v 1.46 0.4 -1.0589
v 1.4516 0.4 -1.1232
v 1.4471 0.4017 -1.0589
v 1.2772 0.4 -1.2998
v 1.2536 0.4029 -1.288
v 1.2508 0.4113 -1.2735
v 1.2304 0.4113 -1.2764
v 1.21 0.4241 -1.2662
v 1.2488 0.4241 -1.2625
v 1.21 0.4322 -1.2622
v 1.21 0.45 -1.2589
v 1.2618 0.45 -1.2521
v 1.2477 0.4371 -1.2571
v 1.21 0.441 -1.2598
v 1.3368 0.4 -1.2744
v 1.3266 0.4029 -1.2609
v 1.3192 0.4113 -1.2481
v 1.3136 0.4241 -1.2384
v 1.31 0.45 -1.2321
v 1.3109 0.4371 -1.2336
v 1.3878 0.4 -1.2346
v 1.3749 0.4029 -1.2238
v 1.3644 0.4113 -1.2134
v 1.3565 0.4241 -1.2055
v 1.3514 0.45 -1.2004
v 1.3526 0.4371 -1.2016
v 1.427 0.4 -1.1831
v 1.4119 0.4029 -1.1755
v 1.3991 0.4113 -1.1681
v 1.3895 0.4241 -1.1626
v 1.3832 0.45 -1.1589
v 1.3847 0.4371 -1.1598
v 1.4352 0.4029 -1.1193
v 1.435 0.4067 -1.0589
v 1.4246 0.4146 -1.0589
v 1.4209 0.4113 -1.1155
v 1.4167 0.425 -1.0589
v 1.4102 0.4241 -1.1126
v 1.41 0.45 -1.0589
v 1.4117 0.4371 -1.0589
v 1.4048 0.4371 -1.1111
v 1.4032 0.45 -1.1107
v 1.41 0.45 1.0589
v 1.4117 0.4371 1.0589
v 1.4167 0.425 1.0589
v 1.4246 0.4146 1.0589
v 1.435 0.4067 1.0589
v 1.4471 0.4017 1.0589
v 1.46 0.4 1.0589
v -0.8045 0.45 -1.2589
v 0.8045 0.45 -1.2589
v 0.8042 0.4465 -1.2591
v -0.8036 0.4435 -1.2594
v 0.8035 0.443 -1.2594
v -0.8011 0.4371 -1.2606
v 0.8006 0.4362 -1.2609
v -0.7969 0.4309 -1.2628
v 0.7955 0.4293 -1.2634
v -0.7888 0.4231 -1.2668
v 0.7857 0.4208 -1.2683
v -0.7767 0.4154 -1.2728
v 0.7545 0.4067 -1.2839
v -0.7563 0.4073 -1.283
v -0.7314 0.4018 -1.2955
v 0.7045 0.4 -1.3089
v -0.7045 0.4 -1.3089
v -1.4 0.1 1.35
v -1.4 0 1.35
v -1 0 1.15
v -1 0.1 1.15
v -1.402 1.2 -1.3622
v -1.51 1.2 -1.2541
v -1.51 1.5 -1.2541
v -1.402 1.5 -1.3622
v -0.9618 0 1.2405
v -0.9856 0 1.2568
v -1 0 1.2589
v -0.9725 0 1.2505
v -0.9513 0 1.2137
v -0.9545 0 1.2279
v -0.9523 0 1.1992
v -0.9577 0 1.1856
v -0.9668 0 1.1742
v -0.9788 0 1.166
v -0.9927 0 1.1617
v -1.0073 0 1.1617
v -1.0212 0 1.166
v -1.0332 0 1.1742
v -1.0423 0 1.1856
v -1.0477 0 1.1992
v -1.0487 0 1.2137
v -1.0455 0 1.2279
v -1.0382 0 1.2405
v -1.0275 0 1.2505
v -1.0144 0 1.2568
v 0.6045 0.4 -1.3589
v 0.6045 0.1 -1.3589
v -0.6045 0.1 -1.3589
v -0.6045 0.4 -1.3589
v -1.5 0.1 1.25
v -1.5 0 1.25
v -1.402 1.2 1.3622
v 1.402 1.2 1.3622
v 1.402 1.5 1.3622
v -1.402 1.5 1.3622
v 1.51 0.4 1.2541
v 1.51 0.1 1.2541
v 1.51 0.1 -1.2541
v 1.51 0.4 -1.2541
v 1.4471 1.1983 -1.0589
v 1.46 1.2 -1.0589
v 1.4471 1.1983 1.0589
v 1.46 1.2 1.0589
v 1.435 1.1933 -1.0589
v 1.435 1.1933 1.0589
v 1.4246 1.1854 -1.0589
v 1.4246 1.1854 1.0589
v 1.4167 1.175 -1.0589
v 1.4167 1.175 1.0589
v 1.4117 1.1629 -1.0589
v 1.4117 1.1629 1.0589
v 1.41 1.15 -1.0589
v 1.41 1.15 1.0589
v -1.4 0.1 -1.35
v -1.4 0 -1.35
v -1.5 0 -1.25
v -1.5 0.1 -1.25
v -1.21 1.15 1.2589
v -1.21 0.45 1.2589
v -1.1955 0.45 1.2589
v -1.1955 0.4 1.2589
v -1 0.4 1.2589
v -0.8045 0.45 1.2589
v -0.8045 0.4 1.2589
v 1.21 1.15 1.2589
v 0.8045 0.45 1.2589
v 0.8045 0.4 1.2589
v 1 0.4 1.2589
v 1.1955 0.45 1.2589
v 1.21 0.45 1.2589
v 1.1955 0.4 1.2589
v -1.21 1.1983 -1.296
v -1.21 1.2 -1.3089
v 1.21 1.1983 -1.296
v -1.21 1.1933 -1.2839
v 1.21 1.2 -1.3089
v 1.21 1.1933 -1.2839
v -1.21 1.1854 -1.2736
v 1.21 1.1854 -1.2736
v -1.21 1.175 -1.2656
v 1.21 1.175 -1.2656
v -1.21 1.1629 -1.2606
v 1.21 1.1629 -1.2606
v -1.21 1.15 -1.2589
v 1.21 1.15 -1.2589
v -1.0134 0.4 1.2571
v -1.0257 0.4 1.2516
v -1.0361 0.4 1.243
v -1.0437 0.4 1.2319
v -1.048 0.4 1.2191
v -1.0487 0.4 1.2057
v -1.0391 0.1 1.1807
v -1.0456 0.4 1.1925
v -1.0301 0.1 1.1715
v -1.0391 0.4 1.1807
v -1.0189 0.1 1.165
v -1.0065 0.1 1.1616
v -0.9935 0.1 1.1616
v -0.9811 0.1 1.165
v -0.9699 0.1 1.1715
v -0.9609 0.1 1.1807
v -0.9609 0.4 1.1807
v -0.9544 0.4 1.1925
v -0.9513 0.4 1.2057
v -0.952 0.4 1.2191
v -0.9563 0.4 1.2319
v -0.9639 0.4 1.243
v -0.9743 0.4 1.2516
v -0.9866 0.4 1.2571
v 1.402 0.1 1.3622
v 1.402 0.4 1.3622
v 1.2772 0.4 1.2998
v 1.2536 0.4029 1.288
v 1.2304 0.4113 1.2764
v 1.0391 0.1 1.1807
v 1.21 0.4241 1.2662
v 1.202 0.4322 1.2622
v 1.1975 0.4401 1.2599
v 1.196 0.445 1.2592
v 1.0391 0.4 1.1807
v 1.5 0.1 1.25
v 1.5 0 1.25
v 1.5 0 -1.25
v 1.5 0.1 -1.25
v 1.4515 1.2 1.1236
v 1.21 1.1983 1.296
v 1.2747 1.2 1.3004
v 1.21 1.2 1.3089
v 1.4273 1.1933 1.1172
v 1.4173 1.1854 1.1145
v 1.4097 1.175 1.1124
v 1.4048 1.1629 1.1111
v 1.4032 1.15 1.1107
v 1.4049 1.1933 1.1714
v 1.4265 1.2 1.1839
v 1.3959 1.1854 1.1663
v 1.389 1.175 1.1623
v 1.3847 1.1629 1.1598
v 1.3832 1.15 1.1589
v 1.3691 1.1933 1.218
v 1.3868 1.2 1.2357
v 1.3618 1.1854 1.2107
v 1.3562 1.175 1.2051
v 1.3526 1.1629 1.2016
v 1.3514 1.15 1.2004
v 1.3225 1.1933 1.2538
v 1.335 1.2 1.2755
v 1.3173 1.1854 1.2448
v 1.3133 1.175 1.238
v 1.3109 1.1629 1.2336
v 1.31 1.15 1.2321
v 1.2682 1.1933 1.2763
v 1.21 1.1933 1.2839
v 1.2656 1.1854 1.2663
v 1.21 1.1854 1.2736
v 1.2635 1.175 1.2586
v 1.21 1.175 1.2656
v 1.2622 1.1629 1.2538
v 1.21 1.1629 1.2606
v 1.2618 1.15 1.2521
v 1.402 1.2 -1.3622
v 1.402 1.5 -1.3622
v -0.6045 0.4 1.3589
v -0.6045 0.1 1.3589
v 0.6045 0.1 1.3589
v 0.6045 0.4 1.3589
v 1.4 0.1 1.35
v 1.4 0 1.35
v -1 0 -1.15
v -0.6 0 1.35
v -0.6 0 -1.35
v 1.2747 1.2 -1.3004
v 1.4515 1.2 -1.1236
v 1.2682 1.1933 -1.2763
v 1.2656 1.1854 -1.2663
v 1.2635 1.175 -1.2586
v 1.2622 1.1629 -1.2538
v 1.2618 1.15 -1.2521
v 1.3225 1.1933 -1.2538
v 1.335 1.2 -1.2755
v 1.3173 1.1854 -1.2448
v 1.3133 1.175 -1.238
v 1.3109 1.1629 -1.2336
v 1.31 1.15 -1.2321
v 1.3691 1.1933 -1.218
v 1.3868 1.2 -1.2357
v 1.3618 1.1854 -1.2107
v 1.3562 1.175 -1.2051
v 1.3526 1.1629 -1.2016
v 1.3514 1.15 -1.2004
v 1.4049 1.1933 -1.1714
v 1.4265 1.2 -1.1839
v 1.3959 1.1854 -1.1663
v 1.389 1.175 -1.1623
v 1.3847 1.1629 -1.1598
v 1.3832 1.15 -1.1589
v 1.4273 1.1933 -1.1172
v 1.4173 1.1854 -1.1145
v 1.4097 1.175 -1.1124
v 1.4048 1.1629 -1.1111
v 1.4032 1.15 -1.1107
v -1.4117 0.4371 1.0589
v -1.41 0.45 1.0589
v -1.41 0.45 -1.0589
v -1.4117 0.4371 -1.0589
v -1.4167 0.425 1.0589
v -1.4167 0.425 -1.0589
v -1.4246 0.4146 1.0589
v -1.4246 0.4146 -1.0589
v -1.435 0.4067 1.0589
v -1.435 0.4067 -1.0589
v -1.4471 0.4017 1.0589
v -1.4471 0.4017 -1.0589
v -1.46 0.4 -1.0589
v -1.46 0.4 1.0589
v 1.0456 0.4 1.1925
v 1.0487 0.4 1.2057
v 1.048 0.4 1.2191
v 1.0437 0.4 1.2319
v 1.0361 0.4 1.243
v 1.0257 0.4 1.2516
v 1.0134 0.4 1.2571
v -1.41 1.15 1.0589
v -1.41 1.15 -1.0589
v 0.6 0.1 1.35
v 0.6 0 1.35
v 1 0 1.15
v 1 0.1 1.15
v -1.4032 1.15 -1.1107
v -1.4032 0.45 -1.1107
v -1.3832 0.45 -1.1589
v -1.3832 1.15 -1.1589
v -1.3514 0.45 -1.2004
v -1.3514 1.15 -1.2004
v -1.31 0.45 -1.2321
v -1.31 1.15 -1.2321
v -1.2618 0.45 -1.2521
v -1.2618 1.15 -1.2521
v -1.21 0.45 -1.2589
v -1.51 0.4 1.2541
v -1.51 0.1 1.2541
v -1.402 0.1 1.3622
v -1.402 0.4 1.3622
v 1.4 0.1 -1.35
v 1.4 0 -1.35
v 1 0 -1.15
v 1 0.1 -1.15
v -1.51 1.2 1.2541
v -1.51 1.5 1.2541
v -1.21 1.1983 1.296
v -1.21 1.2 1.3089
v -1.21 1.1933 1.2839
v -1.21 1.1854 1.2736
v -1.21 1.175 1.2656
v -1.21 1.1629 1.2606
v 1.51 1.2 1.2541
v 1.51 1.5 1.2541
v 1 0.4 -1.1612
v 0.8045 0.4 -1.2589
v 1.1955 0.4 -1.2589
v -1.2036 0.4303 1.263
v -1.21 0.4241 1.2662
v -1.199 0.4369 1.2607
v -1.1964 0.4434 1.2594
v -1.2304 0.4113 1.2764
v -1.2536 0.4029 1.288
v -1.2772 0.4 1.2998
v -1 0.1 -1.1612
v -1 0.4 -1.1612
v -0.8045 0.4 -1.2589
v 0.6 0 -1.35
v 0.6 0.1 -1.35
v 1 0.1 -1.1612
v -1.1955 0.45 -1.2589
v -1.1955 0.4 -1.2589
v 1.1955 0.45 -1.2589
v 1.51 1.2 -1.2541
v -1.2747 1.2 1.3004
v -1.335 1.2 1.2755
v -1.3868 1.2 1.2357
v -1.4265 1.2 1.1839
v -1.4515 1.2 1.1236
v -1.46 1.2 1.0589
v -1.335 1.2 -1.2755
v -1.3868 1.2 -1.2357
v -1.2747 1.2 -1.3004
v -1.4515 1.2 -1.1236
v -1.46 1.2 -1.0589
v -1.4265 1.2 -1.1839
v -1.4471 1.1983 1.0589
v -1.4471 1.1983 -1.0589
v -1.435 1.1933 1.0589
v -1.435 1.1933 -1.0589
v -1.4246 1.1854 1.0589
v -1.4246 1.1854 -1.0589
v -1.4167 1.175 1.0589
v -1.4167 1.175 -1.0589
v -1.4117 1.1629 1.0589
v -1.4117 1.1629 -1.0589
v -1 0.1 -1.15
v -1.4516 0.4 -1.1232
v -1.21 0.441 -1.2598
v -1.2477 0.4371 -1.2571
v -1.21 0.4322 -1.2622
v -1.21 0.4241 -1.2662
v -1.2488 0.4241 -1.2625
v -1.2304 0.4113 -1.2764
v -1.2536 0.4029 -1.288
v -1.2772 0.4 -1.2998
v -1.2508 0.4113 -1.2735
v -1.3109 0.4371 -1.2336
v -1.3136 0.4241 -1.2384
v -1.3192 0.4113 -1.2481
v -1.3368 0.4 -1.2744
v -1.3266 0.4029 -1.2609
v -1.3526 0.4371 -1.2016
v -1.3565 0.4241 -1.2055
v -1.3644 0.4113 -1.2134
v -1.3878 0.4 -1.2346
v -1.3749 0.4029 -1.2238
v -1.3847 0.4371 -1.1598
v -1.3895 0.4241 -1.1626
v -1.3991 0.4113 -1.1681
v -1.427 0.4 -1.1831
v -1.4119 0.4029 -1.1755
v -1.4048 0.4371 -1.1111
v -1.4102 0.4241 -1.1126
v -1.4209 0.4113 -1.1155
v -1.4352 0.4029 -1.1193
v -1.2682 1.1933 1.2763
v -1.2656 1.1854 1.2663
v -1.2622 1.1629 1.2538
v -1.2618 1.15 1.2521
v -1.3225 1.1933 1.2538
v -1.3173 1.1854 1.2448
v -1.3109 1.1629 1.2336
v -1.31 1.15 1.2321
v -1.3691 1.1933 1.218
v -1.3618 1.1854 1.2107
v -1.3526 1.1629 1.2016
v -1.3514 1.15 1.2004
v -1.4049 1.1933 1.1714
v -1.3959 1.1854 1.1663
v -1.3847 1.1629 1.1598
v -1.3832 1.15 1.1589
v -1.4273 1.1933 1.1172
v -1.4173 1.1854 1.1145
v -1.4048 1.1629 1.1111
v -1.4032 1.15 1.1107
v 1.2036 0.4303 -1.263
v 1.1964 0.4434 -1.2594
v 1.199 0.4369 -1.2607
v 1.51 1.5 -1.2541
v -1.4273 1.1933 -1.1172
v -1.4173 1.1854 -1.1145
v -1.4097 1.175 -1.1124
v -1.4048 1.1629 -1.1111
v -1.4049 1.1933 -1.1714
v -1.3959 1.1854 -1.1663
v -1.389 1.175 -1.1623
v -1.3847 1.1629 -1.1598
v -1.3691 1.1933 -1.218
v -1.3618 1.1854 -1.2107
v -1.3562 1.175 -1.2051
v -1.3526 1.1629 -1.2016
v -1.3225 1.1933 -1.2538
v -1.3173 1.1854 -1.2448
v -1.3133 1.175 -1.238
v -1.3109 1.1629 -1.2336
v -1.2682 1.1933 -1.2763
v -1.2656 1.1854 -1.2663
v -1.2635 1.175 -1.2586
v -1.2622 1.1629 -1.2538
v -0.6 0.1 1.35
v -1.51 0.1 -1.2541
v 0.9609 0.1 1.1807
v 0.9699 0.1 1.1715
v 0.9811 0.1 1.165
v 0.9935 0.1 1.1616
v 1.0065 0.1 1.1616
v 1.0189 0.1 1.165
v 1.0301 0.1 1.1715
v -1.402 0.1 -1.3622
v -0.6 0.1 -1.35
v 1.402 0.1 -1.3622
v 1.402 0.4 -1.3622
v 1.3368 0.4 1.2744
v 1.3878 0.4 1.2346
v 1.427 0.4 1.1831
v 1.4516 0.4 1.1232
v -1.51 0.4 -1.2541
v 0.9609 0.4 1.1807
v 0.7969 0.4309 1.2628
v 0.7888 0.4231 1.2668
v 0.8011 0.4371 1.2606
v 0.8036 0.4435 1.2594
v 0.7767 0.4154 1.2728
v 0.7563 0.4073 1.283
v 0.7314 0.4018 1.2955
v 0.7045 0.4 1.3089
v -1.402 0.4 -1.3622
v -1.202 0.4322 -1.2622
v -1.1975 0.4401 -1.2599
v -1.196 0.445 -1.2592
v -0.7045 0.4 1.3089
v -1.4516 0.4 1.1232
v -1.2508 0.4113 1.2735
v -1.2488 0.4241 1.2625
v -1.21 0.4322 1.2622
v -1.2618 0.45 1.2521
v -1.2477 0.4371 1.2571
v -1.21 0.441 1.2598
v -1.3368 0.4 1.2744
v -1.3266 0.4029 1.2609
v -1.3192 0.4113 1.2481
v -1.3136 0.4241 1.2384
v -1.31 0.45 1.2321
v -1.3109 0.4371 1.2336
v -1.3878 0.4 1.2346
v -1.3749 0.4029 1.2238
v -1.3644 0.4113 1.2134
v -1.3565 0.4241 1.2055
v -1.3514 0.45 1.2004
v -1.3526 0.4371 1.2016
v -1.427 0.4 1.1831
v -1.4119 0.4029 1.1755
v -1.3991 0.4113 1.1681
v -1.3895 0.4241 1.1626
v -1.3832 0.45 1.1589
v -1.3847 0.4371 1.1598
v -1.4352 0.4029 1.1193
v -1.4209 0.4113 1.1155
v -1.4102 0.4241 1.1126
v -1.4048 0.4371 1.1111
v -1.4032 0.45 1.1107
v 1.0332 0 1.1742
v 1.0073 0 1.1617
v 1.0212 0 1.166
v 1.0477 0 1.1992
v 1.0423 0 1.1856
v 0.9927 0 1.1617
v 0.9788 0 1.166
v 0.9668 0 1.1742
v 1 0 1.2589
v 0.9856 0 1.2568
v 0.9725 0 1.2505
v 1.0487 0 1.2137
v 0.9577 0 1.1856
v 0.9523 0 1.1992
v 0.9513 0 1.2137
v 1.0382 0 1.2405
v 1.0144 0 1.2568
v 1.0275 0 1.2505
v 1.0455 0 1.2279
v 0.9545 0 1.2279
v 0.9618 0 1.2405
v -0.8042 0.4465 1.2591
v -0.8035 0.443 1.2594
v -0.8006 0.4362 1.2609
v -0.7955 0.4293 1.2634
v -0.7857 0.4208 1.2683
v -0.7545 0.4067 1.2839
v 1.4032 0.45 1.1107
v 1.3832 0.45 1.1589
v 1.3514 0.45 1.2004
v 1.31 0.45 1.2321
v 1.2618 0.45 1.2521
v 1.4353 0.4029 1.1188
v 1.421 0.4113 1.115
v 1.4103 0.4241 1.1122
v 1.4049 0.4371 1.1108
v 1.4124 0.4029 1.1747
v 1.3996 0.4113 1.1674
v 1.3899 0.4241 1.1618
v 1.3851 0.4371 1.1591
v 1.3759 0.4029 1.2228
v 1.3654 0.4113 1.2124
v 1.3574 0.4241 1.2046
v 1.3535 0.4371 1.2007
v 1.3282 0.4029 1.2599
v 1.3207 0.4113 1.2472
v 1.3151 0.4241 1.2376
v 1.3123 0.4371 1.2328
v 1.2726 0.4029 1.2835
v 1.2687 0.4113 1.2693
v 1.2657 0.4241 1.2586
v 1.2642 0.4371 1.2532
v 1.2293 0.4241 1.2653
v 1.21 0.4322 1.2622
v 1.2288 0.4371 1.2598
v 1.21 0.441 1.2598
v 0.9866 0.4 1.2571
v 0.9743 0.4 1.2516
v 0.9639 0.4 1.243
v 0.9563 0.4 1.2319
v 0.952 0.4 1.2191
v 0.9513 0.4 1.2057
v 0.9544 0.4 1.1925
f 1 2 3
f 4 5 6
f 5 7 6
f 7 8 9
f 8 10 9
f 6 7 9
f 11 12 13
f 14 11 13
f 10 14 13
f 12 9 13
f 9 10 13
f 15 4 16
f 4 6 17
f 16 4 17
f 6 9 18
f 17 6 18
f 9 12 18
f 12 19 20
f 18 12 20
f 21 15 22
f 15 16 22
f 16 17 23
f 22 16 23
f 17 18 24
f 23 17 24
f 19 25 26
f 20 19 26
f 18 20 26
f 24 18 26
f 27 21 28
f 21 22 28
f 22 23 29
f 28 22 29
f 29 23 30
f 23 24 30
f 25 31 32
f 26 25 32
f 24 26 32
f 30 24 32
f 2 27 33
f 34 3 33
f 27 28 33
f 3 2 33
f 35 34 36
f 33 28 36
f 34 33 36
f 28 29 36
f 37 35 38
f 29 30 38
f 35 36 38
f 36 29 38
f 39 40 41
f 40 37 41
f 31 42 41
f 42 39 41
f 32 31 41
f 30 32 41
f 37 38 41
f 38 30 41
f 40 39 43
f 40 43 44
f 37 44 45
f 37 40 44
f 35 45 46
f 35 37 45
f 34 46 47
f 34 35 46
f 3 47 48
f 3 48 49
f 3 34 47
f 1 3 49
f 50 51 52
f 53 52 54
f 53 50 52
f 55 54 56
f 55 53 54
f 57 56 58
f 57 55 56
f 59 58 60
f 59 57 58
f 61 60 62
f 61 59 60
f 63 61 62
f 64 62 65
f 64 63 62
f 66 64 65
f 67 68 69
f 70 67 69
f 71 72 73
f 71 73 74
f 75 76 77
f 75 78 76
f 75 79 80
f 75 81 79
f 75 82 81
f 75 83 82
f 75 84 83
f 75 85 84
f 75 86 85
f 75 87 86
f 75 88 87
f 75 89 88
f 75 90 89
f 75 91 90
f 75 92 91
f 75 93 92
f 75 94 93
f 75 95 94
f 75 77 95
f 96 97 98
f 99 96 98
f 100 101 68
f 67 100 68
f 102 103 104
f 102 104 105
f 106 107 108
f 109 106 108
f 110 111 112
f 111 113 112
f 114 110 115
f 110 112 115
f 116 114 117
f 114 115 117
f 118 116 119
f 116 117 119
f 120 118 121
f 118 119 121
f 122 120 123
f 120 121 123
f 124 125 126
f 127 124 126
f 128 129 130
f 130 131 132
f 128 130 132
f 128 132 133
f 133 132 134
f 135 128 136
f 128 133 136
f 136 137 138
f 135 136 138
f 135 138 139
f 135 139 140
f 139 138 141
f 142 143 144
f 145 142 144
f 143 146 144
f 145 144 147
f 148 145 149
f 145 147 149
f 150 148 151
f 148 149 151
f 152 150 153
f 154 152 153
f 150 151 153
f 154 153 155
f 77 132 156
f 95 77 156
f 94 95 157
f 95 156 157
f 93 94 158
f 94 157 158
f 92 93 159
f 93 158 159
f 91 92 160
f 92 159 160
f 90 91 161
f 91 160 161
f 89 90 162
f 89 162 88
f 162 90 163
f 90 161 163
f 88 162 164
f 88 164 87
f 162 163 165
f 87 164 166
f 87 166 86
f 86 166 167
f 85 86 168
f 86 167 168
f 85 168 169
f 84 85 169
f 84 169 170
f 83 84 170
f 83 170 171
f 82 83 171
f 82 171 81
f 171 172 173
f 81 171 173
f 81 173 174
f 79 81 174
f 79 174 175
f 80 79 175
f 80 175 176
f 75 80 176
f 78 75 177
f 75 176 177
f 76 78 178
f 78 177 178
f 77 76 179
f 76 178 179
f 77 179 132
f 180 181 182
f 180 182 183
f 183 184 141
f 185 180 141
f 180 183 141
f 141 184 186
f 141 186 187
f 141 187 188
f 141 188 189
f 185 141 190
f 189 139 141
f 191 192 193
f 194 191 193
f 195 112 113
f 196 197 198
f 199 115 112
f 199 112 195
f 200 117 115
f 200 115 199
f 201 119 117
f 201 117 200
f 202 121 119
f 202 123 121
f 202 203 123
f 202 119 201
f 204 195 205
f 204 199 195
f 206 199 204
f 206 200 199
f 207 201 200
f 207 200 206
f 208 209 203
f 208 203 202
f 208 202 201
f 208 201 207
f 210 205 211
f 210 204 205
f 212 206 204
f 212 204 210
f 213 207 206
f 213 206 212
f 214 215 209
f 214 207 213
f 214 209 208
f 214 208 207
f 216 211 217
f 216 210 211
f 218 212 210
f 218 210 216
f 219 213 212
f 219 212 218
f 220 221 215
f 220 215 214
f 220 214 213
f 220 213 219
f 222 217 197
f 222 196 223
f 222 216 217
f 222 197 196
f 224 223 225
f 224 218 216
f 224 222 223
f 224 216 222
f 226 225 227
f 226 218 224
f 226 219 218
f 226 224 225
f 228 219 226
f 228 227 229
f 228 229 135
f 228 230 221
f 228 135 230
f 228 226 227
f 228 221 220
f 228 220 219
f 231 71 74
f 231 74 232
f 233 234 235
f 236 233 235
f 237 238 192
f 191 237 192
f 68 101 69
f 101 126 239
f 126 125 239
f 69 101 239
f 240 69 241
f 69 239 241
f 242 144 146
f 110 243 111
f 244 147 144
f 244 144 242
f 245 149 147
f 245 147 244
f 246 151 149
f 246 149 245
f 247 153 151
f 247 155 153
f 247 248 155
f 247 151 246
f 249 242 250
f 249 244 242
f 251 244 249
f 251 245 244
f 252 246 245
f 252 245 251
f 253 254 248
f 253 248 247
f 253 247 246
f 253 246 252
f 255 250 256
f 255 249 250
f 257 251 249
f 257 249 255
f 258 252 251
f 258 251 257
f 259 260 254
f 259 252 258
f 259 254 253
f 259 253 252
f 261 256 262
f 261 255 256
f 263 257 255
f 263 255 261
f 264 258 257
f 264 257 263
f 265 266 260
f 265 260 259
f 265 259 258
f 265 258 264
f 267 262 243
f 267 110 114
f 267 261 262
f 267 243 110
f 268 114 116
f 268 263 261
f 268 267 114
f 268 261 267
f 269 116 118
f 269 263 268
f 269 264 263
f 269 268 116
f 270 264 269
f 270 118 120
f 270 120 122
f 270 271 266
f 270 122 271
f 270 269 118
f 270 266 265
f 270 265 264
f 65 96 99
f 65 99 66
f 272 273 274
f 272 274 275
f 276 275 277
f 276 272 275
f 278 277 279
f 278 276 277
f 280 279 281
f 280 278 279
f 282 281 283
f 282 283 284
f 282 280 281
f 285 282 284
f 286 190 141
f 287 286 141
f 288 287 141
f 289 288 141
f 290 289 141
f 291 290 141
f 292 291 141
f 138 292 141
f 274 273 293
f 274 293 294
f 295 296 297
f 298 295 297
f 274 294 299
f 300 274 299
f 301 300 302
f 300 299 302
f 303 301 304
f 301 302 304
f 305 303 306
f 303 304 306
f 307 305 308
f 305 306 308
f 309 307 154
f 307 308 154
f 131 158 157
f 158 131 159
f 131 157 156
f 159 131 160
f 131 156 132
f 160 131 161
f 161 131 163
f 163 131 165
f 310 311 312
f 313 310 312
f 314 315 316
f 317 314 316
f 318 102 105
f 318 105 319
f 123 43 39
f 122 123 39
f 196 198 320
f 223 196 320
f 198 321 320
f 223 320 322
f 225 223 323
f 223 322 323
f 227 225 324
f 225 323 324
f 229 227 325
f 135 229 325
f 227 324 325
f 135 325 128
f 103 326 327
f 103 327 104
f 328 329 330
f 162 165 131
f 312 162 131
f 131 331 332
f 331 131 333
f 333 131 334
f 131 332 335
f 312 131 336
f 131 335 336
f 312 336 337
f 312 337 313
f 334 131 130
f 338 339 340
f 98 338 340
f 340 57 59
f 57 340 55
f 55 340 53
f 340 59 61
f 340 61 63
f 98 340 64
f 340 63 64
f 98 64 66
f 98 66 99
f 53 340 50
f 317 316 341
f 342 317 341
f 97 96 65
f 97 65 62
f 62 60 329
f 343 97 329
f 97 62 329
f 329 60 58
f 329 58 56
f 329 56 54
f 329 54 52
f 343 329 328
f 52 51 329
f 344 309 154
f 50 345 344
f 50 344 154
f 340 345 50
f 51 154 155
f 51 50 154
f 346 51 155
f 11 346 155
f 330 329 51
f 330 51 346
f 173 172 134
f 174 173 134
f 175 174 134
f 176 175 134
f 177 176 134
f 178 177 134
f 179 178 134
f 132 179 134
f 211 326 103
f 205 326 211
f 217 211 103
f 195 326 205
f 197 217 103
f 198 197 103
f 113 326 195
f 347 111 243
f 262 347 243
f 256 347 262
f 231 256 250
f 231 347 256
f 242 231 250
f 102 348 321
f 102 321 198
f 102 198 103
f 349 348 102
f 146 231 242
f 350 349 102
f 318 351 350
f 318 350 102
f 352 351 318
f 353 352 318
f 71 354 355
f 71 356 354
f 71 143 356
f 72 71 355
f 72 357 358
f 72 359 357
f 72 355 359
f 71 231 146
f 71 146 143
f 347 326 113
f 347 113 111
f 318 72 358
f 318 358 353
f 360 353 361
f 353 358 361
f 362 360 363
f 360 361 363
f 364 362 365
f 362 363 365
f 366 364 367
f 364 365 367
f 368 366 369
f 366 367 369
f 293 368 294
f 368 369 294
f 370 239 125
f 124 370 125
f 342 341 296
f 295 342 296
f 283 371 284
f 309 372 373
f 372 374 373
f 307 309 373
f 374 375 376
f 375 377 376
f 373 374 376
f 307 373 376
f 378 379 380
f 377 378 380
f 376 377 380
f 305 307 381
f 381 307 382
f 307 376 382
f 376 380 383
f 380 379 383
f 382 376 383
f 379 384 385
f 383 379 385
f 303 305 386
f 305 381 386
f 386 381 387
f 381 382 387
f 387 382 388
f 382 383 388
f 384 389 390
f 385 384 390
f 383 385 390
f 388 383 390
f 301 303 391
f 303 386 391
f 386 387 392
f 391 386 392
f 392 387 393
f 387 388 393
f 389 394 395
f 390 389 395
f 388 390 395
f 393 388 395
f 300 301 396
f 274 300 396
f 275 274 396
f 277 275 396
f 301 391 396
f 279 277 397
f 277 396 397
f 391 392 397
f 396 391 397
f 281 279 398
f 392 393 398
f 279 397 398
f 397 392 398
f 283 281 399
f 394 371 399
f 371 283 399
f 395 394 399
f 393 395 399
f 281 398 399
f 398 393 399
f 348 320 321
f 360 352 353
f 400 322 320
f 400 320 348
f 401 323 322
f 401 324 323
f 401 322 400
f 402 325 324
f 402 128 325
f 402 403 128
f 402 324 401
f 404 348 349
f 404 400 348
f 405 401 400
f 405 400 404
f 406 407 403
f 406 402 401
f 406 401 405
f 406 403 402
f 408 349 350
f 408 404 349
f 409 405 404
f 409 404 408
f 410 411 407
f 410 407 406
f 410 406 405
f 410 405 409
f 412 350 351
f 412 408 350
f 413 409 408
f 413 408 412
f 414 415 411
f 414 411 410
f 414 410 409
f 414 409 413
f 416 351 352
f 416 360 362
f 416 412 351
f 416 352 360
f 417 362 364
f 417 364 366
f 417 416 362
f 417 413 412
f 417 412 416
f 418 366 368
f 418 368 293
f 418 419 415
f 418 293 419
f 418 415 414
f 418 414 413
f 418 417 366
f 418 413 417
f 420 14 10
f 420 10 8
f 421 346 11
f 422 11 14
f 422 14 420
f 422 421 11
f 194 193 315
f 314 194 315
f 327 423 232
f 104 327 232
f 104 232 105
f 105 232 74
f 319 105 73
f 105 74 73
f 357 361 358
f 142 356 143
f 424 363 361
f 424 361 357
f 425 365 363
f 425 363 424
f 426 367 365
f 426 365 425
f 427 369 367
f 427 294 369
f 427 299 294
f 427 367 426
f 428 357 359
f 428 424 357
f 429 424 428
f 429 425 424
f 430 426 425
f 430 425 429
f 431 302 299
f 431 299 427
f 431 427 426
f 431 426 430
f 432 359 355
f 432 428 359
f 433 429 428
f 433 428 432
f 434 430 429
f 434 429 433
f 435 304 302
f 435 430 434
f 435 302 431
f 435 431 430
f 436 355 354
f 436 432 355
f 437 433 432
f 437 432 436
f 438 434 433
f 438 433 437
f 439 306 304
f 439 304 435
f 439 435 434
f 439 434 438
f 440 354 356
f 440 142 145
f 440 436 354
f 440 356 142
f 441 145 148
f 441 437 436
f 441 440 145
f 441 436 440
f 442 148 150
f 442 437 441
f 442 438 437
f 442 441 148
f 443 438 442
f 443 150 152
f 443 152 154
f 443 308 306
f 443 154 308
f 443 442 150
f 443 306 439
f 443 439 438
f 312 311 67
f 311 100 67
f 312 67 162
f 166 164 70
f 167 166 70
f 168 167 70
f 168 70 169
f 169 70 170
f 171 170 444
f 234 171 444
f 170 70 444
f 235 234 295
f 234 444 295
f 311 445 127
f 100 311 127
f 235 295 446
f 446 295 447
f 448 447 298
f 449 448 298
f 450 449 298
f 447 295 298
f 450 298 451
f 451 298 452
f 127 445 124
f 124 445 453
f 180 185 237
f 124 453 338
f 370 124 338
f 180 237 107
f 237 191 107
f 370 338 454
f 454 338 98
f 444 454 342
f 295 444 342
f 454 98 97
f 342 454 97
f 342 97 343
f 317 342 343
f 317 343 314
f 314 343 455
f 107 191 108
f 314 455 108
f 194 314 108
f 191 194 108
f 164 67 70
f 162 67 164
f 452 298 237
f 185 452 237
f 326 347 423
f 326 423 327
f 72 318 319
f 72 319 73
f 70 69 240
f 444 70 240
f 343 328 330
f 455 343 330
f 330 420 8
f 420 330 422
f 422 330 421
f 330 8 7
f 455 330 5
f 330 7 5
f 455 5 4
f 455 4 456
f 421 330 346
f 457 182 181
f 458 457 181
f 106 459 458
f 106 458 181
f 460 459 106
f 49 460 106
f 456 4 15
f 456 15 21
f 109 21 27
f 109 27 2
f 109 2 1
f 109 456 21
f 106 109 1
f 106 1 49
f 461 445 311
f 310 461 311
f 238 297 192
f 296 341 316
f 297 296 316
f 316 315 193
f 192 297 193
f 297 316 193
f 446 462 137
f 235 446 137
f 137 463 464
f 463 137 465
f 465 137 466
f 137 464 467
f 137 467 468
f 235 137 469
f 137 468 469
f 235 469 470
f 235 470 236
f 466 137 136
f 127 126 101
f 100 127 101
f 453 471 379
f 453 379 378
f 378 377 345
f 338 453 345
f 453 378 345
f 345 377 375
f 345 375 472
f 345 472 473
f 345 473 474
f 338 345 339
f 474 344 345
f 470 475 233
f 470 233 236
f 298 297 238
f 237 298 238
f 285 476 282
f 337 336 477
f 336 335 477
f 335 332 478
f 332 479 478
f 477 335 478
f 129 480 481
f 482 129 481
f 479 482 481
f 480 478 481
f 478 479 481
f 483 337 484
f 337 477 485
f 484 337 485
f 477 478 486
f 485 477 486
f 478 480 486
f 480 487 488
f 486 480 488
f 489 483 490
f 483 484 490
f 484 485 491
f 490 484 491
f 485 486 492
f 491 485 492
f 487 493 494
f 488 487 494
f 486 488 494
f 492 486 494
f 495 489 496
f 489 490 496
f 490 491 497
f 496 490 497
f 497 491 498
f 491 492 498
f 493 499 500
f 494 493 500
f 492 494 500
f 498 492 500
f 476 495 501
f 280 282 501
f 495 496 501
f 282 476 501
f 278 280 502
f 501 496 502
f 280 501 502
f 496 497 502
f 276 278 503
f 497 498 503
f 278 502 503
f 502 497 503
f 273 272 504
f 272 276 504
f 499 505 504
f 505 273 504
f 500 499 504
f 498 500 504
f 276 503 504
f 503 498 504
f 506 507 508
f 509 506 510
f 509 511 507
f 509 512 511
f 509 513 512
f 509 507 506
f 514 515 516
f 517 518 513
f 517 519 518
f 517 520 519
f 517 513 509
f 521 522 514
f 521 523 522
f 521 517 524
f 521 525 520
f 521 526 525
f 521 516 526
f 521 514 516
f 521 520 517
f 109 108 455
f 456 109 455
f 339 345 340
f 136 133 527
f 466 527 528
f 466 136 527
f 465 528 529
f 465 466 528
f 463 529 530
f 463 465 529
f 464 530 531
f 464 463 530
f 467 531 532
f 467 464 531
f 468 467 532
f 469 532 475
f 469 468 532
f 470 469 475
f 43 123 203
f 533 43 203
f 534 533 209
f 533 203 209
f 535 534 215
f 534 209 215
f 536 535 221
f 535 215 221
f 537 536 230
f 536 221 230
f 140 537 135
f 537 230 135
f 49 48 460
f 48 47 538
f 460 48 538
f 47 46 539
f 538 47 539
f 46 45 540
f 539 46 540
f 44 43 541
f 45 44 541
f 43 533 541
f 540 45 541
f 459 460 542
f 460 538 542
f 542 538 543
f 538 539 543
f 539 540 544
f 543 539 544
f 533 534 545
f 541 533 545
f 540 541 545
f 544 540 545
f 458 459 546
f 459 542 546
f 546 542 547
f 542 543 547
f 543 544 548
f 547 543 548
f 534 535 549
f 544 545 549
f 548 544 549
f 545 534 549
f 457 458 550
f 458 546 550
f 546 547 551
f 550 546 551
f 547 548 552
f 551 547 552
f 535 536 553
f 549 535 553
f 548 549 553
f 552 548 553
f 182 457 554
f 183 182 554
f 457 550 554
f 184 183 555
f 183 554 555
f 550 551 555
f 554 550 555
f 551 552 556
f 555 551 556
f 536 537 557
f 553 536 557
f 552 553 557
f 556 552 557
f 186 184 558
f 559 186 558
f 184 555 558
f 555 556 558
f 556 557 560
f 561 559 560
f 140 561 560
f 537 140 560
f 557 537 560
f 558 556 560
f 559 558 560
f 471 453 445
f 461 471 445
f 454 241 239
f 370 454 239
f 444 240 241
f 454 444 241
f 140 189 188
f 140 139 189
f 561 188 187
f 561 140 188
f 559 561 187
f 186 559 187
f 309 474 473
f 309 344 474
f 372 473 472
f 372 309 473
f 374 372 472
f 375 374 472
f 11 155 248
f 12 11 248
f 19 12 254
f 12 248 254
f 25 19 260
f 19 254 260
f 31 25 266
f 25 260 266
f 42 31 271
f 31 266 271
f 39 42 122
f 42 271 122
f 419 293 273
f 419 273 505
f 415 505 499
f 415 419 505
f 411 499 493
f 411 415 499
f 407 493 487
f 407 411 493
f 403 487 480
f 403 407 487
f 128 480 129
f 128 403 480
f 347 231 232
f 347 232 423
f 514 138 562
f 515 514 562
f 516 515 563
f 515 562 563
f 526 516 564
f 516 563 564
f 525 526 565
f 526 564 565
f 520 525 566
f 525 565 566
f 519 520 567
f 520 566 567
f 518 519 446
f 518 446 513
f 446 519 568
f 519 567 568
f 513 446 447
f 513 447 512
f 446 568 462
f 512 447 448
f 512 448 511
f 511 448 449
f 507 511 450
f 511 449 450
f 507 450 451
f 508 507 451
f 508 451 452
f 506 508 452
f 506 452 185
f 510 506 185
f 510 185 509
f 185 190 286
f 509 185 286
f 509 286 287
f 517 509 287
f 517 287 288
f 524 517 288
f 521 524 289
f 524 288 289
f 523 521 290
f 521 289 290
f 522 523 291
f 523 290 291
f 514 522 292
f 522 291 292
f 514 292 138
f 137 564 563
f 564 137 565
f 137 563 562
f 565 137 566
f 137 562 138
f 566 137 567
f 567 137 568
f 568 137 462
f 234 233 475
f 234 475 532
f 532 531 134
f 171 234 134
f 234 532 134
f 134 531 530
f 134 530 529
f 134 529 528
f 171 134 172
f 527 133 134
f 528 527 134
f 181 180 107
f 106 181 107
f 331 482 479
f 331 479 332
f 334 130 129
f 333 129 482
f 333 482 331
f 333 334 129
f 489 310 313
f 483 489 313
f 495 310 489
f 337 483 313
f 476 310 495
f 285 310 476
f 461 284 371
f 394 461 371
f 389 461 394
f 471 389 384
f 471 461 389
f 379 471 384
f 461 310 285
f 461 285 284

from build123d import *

# Parameters (mm, degrees)
RESSALTO_EXTRUS_O1_DEPTH   = 0.1
RESSALTO_EXTRUS_O1_2_DEPTH = 0.1
RESSALTO_EXTRUS_O2_DEPTH   = 0.3
ESBO_O3_W                  = 2.82
ESBO_O3_H                  = 2.517888544
RESSALTO_EXTRUS_O3_DEPTH   = 0.8
RESSALTO_EXTRUS_O4_DEPTH   = 0.3
FILETE1_R                  = 0.2
FILETE2_R                  = 0.05
FILETE3_R                  = 0.05
RESSALTO_EXTRUS_O5_REACH   = 4.312
ESBO_O5_R                  = 0.048881966


with BuildPart() as part:
    # Esboço1 → Ressalto-extrusão1 (new body)
    with BuildSketch(Plane(origin=(0, 0, 0), x_dir=(1, 0, 0), z_dir=(0, 1, 0))):
        Polygon((-1.5, 1.25), (-1.5, -1.25), (-1.4, -1.35), (-1, -1.15), (-0.6, -1.35), (-0.6, 1.35), (-1, 1.15), (-1.4, 1.35), align=None)
    extrude(amount=RESSALTO_EXTRUS_O1_DEPTH)



with BuildPart() as body_2:
    # Esboço1 → Ressalto-extrus_o1 2 (new body)
    with BuildSketch(Plane(origin=(0, 0, 0), x_dir=(1, 0, 0), z_dir=(0, 1, 0))):
        Polygon((1.4, -1.35), (1.5, -1.25), (1.5, 1.25), (1.4, 1.35), (1, 1.15), (0.6, 1.35), (0.6, -1.35), (1, -1.15), align=None)
    extrude(amount=RESSALTO_EXTRUS_O1_2_DEPTH)


with BuildPart() as part_1:
    add(part.part)

    add(body_2.part)  # Ressalto-extrusão2 merges body 2
    # Esboço2 → Ressalto-extrusão2 (add)
    with BuildSketch(Plane(origin=(0, 0.1, 0), x_dir=(1, 0, 0), z_dir=(0, 1, 0))):
        Polygon((-0.604472136, 1.358944272), (-1, 1.16118034), (-1.40197453, 1.362167605), (-1.51, 1.254142136), (-1.51, -1.254142136), (-1.40197453, -1.362167605), (-1, -1.16118034), (-0.604472136, -1.358944272), (0.604472136, -1.358944272), (1, -1.16118034), (1.40197453, -1.362167605), (1.51, -1.254142136), (1.51, 1.254142136), (1.40197453, 1.362167605), (1, 1.16118034), (0.604472136, 1.358944272), align=None)
    extrude(amount=RESSALTO_EXTRUS_O2_DEPTH)

    # Esboço3 → Ressalto-extrusão3 (add)
    with BuildSketch(Plane(origin=(0, 0.4, 0), x_dir=(1, 0, 0), z_dir=(0, 1, 0))):
        Rectangle(ESBO_O3_W, ESBO_O3_H)
    extrude(amount=RESSALTO_EXTRUS_O3_DEPTH)

    # Esboço4 → Ressalto-extrusão4 (add)
    with BuildSketch(Plane(origin=(0, 1.2, 0), x_dir=(1, 0, 0), z_dir=(0, 1, 0))):
        Polygon((-1.51, 1.254142136), (-1.40197453, 1.362167605), (1.40197453, 1.362167605), (1.51, 1.254142136), (1.51, -1.254142136), (1.40197453, -1.362167605), (-1.40197453, -1.362167605), (-1.51, -1.254142136), align=None)
    extrude(amount=RESSALTO_EXTRUS_O4_DEPTH)

    # Filete1
    filete1_edges = [part_1.edges().sort_by_distance(p)[0] for p in [
        (1.41, 0.8, 1.258944272),
        (1.41, 0.8, -1.258944272),
        (-1.41, 0.8, -1.258944272),
        (-1.41, 0.8, 1.258944272),
    ]]
    fillet(filete1_edges, radius=FILETE1_R)

    # Filete2
    filete2_edges = [part_1.edges().sort_by_distance(p)[0] for p in [
        (-1.41, 1.2, 0),
        (0, 1.2, -1.258944272),
        (1.41, 1.2, 0),
        (0, 1.2, 1.258944272),
        (-1.351421356, 1.2, -1.200365628),
        (1.351421356, 1.2, -1.200365628),
        (1.351421356, 1.2, 1.200365628),
        (-1.351421356, 1.2, 1.200365628),
    ]]
    fillet(filete2_edges, radius=FILETE2_R)

    # Filete3
    # the kernel refuses this fillet: 0.05 mm, written as the material it adds along each edge
    with BuildSketch(Plane(origin=(-1.41, 0.4, 1.058944272), x_dir=(0, 1, 0), z_dir=(0, 0, -1)), Plane(origin=(1.41, 0.4, -1.058944272), x_dir=(0, 1, 0), z_dir=(0, 0, 1))) as filete3_piece_1:
        with BuildLine():
            CenterArc((FILETE3_R, -FILETE3_R), FILETE3_R, 90, 90)
            Line((0, -FILETE3_R), (0, 0))
            Line((0, 0), (FILETE3_R, 0))
        make_face()
    extrude(amount=2.117888544)
    with BuildSketch(Plane(origin=(1.070527864, 0.4, -1.258944272), x_dir=(0, 1, 0), z_dir=(1, 0, 0))) as filete3_piece_2_section:
        with BuildLine():
            CenterArc((FILETE3_R, -FILETE3_R), FILETE3_R, 90, 90)
            Line((0, -FILETE3_R), (0, 0))
            Line((0, 0), (FILETE3_R, 0))
        make_face()
    filete3_piece_2 = extrude(amount=0.139472136, mode=Mode.PRIVATE)
    filete3_piece_2 = split(filete3_piece_2, bisect_by=Plane(origin=(1.203892593, 0.418399611, -1.263126636), z_dir=(0.4472135954999593, 0, 0.8944271909999152)), keep=Keep.TOP, mode=Mode.PRIVATE)
    add(filete3_piece_2)
    with BuildSketch(Plane(origin=(-1.070527864, 0.4, 1.258944272), x_dir=(0, 1, 0), z_dir=(-1, 0, 0))) as filete3_piece_3_section:
        with BuildLine():
            CenterArc((FILETE3_R, -FILETE3_R), FILETE3_R, 90, 90)
            Line((0, -FILETE3_R), (0, 0))
            Line((0, 0), (FILETE3_R, 0))
        make_face()
    filete3_piece_3 = extrude(amount=0.139472136, mode=Mode.PRIVATE)
    filete3_piece_3 = split(filete3_piece_3, bisect_by=Plane(origin=(-1.203892593, 0.418399611, 1.263126636), z_dir=(-0.44721359549995854, 0, -0.8944271909999156)), keep=Keep.TOP, mode=Mode.PRIVATE)
    add(filete3_piece_3)
    with BuildSketch(Plane(origin=(-1.21, 0.4, -1.058944272), x_dir=(0, 0, -1), z_dir=(1, 0, 0))) as filete3_piece_4_section:
        with BuildLine():
            CenterArc((0.2 + FILETE3_R, FILETE3_R), FILETE3_R, 180, 90)
            Line((0.2 + FILETE3_R, 0), (0.2, 0))
            Line((0.2, 0), (0.2, FILETE3_R))
        make_face()
    filete3_piece_4 = revolve(axis=Axis((-1.21, 0.4, -1.058944272), (0, 1, 0)), revolution_arc=90, mode=Mode.PRIVATE)
    filete3_piece_4 = split(filete3_piece_4, bisect_by=Plane(origin=(-1.30894977, 0.414305441, -1.315655225), z_dir=(-0.44721359549995854, 0, 0.8944271909999156)), keep=Keep.TOP, mode=Mode.PRIVATE)
    add(filete3_piece_4)
    with BuildSketch(Plane(origin=(1.21, 0.4, -1.058944272), x_dir=(0, 0, -1), z_dir=(-1, 0, 0))) as filete3_piece_5_section:
        with BuildLine():
            CenterArc((0.2 + FILETE3_R, -FILETE3_R), FILETE3_R, 90, 90)
            Line((0.2 + FILETE3_R, 0), (0.2, 0))
            Line((0.2, 0), (0.2, -FILETE3_R))
        make_face()
    filete3_piece_5 = revolve(axis=Axis((1.21, 0.4, -1.058944272), (0, -1, 0)), revolution_arc=90, mode=Mode.PRIVATE)
    filete3_piece_5 = split(filete3_piece_5, bisect_by=Plane(origin=(1.30894977, 0.414305441, -1.315655225), z_dir=(0.4472135954999593, 0, 0.8944271909999152)), keep=Keep.TOP, mode=Mode.PRIVATE)
    add(filete3_piece_5)
    with BuildSketch(Plane(origin=(1.21, 0.4, 1.058944272), x_dir=(1, 0, 0), z_dir=(0, 0, -1))) as filete3_piece_6_section:
        with BuildLine():
            CenterArc((0.2 + FILETE3_R, -FILETE3_R), FILETE3_R, 90, 90)
            Line((0.2 + FILETE3_R, 0), (0.2, 0))
            Line((0.2, 0), (0.2, -FILETE3_R))
        make_face()
    filete3_piece_6 = revolve(axis=Axis((1.21, 0.4, 1.058944272), (0, -1, 0)), revolution_arc=90, mode=Mode.PRIVATE)
    filete3_piece_6 = split(filete3_piece_6, bisect_by=Plane(origin=(1.30894977, 0.414305441, 1.315655225), z_dir=(0.4472135954999591, 0, -0.8944271909999153)), keep=Keep.TOP, mode=Mode.PRIVATE)
    add(filete3_piece_6)
    with BuildSketch(Plane(origin=(-1.21, 0.4, 1.058944272), x_dir=(0, 0, 1), z_dir=(1, 0, 0))) as filete3_piece_7_section:
        with BuildLine():
            CenterArc((0.2 + FILETE3_R, -FILETE3_R), FILETE3_R, 90, 90)
            Line((0.2 + FILETE3_R, 0), (0.2, 0))
            Line((0.2, 0), (0.2, -FILETE3_R))
        make_face()
    filete3_piece_7 = revolve(axis=Axis((-1.21, 0.4, 1.058944272), (0, -1, 0)), revolution_arc=90, mode=Mode.PRIVATE)
    filete3_piece_7 = split(filete3_piece_7, bisect_by=Plane(origin=(-1.30894977, 0.414305441, 1.315655225), z_dir=(-0.44721359549995854, 0, -0.8944271909999156)), keep=Keep.TOP, mode=Mode.PRIVATE)
    add(filete3_piece_7)
    with BuildSketch(Plane(origin=(-1.21, 0.4, -1.258944272), x_dir=(0, 1, 0), z_dir=(1, 0, 0))) as filete3_piece_8_section:
        with BuildLine():
            CenterArc((FILETE3_R, -FILETE3_R), FILETE3_R, 90, 90)
            Line((0, -FILETE3_R), (0, 0))
            Line((0, 0), (FILETE3_R, 0))
        make_face()
    filete3_piece_8 = extrude(amount=0.139472136, mode=Mode.PRIVATE)
    filete3_piece_8 = split(filete3_piece_8, bisect_by=Plane(origin=(-1.203892593, 0.418399611, -1.263126636), z_dir=(-0.44721359549995854, 0, 0.8944271909999156)), keep=Keep.TOP, mode=Mode.PRIVATE)
    add(filete3_piece_8)
    with BuildSketch(Plane(origin=(-0.929472136, 0.4, -1.258944272), x_dir=(0, 1, 0), z_dir=(1, 0, 0))) as filete3_piece_9_section:
        with BuildLine():
            CenterArc((FILETE3_R, -FILETE3_R), FILETE3_R, 90, 90)
            Line((0, -FILETE3_R), (0, 0))
            Line((0, 0), (FILETE3_R, 0))
        make_face()
    filete3_piece_9 = extrude(amount=1.858944272, mode=Mode.PRIVATE)
    filete3_piece_9 = split(filete3_piece_9, bisect_by=Plane(origin=(-0.156516973, 0.41130062, -1.582921854), z_dir=(0.44721359549995937, 0, 0.8944271909999152)), keep=Keep.TOP, mode=Mode.PRIVATE)
    filete3_piece_9 = split(filete3_piece_9, bisect_by=Plane(origin=(0.156516973, 0.41130062, -1.582921854), z_dir=(-0.44721359549995915, 0, 0.8944271909999153)), keep=Keep.TOP, mode=Mode.PRIVATE)
    add(filete3_piece_9)
    with BuildSketch(Plane(origin=(1.21, 0.4, 1.258944272), x_dir=(0, 1, 0), z_dir=(-1, 0, 0))) as filete3_piece_10_section:
        with BuildLine():
            CenterArc((FILETE3_R, -FILETE3_R), FILETE3_R, 90, 90)
            Line((0, -FILETE3_R), (0, 0))
            Line((0, 0), (FILETE3_R, 0))
        make_face()
    filete3_piece_10 = extrude(amount=0.139472136, mode=Mode.PRIVATE)
    filete3_piece_10 = split(filete3_piece_10, bisect_by=Plane(origin=(1.203892593, 0.418399611, 1.263126636), z_dir=(0.4472135954999591, 0, -0.8944271909999153)), keep=Keep.TOP, mode=Mode.PRIVATE)
    add(filete3_piece_10)
    with BuildSketch(Plane(origin=(0.929472136, 0.4, 1.258944272), x_dir=(0, 1, 0), z_dir=(-1, 0, 0))) as filete3_piece_11_section:
        with BuildLine():
            CenterArc((FILETE3_R, -FILETE3_R), FILETE3_R, 90, 90)
            Line((0, -FILETE3_R), (0, 0))
            Line((0, 0), (FILETE3_R, 0))
        make_face()
    filete3_piece_11 = extrude(amount=1.858944272, mode=Mode.PRIVATE)
    filete3_piece_11 = split(filete3_piece_11, bisect_by=Plane(origin=(0.156516973, 0.41130062, 1.582921854), z_dir=(-0.44721359549995876, 0, -0.8944271909999155)), keep=Keep.TOP, mode=Mode.PRIVATE)
    filete3_piece_11 = split(filete3_piece_11, bisect_by=Plane(origin=(-0.156516973, 0.41130062, 1.582921854), z_dir=(0.44721359549995926, 0, -0.8944271909999153)), keep=Keep.TOP, mode=Mode.PRIVATE)
    add(filete3_piece_11)

    # Ressalto-extrusão5: up to this face of the body (flat: up to its plane)
    ressalto_extrus_o5_end = Plane(part_1.part.faces().sort_by_distance((-1.051696165, 0, 0))[0])
    # Esboço5 → Ressalto-extrusão5 (add, up to the picked face)
    with BuildSketch(Plane.XZ.offset(-0.4), mode=Mode.PRIVATE) as ressalto_extrus_o5_sk1:
        with Locations(Location((-1, 1.210062306, 0), (0, 0, 90))):
            Circle(ESBO_O5_R)
    ressalto_extrus_o5_tool1 = split(extrude(ressalto_extrus_o5_sk1.sketch, amount=RESSALTO_EXTRUS_O5_REACH, mode=Mode.PRIVATE), bisect_by=ressalto_extrus_o5_end, keep=Keep.BOTH, mode=Mode.PRIVATE)
    # Esboço5 → Ressalto-extrusão5 (add, up to the picked face)
    with BuildSketch(Plane.XZ.offset(-0.4), mode=Mode.PRIVATE) as ressalto_extrus_o5_sk2:
        with Locations(Location((1, 1.210062306, 0), (0, 0, 90))):
            Circle(ESBO_O5_R)
    ressalto_extrus_o5_tool2 = split(extrude(ressalto_extrus_o5_sk2.sketch, amount=RESSALTO_EXTRUS_O5_REACH, mode=Mode.PRIVATE), bisect_by=ressalto_extrus_o5_end, keep=Keep.BOTH, mode=Mode.PRIVATE)
    add(ressalto_extrus_o5_tool1.solids().sort_by(Axis((-1, 0.4, 1.210062), (0, -1, 0)))[0])
    add(ressalto_extrus_o5_tool2.solids().sort_by(Axis((1, 0.4, 1.210062), (0, -1, 0)))[0])


solid = part_1.part
